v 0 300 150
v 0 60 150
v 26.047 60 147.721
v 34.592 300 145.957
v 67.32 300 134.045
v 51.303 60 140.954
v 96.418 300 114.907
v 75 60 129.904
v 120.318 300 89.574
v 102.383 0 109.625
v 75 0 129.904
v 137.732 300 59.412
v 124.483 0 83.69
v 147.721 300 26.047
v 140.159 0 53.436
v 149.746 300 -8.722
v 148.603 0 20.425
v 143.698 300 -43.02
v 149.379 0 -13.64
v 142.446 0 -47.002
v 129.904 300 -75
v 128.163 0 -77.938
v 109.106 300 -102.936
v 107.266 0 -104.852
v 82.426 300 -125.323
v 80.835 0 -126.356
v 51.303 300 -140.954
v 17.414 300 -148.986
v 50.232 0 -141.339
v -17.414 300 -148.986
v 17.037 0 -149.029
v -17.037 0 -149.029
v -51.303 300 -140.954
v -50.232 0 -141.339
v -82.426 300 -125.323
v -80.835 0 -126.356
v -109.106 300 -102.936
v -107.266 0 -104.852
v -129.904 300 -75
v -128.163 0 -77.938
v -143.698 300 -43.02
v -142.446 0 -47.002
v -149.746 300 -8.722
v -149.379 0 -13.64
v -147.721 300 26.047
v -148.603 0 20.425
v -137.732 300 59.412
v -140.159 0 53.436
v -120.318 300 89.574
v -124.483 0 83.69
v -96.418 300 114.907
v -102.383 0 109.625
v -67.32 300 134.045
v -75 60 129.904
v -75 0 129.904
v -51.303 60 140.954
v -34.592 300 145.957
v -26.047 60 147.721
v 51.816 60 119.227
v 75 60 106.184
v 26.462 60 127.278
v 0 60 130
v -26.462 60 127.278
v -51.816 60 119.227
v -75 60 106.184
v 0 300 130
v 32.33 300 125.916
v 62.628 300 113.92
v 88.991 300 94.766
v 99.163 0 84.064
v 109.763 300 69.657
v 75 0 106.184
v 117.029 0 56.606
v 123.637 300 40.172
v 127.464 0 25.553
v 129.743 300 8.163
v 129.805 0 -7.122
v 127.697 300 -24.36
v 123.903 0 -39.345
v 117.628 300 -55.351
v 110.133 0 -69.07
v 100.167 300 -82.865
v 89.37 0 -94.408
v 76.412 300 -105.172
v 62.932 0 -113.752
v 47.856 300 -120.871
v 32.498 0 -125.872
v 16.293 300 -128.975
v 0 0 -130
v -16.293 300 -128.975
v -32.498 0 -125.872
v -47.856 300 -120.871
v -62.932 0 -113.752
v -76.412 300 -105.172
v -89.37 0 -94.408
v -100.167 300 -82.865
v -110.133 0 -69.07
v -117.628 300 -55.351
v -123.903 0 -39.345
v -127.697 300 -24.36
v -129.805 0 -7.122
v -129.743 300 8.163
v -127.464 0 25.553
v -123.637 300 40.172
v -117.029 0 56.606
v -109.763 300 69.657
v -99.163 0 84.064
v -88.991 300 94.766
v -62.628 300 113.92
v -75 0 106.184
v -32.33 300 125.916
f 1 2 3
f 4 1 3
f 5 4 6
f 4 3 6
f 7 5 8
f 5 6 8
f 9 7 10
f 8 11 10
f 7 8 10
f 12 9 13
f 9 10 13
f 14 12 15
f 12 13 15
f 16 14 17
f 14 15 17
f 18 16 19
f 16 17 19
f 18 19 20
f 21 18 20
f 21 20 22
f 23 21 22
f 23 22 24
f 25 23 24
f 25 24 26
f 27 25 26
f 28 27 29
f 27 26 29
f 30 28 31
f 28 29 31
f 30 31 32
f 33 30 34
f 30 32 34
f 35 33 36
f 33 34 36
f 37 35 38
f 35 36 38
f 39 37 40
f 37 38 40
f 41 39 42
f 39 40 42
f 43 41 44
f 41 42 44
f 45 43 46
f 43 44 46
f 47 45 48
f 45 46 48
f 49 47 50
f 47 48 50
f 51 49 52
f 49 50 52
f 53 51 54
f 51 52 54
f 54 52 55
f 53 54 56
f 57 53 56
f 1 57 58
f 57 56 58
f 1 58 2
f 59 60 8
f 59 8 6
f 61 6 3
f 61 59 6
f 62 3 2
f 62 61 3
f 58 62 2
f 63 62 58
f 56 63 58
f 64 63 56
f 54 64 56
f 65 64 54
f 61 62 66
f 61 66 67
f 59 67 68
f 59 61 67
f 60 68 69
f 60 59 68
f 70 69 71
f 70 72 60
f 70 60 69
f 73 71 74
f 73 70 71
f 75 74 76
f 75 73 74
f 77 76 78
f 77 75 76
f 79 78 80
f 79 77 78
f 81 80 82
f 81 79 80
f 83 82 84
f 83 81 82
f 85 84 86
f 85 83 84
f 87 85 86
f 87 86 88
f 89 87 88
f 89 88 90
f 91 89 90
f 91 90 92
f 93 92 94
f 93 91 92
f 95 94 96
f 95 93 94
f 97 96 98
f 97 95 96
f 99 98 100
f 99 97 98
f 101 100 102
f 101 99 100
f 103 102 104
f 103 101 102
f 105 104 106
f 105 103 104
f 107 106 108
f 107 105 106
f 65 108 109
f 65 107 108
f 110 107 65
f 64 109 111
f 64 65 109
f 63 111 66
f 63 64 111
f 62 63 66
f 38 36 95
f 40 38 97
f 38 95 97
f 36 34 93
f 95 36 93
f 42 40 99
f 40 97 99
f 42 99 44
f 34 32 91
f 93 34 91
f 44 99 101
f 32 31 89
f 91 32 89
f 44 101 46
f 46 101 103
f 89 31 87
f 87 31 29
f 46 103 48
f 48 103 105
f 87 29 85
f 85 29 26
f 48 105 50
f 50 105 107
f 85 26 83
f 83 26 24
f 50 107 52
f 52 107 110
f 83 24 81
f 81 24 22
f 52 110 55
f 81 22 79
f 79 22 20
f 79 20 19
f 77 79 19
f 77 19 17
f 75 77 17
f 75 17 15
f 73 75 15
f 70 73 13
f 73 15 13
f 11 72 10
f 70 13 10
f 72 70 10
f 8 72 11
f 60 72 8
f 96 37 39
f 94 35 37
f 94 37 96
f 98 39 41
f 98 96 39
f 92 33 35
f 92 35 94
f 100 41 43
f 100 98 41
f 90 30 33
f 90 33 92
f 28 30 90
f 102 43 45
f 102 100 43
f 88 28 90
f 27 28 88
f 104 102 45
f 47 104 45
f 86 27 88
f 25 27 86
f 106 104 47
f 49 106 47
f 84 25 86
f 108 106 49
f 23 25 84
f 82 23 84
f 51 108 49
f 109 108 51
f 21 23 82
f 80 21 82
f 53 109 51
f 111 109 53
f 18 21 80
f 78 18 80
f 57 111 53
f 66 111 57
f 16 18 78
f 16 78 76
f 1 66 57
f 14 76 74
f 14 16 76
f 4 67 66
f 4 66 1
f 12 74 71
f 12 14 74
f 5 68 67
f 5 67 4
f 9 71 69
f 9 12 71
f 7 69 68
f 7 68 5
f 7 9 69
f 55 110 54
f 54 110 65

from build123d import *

# Parameters (mm, degrees)
IZIM1_R                     = 150
IZIM1_R_2                   = 130
Y_KSEKLIK_EKSTR_ZYON1_DEPTH = 300
IZIM2_W                     = 75
IZIM2_H                     = 60
KES_EKSTR_ZYON1_DEPTH       = 180


with BuildPart() as part:
    # Çizim1 → Yükseklik-Ekstrüzyon1 (new body)
    with BuildSketch(Plane(origin=(0, 0, 0), x_dir=(1, 0, 0), z_dir=(0, 1, 0))):
        with Locations(Location((0, 0, 0), (0, 0, 270))):
            Circle(IZIM1_R)
        with Locations(Location((0, 0, 0), (0, 0, 270))):
            Circle(IZIM1_R_2, mode=Mode.SUBTRACT)
    extrude(amount=Y_KSEKLIK_EKSTR_ZYON1_DEPTH)

    # Çizim2 → Kes-Ekstrüzyon1 (cut)
    with BuildSketch(Plane.XY):
        with Locations((-37.5, 30)):
            Rectangle(IZIM2_W, IZIM2_H)
        with Locations((37.5, 30)):
            Rectangle(IZIM2_W, IZIM2_H)
    extrude(amount=KES_EKSTR_ZYON1_DEPTH, mode=Mode.SUBTRACT)


solid = part.part
